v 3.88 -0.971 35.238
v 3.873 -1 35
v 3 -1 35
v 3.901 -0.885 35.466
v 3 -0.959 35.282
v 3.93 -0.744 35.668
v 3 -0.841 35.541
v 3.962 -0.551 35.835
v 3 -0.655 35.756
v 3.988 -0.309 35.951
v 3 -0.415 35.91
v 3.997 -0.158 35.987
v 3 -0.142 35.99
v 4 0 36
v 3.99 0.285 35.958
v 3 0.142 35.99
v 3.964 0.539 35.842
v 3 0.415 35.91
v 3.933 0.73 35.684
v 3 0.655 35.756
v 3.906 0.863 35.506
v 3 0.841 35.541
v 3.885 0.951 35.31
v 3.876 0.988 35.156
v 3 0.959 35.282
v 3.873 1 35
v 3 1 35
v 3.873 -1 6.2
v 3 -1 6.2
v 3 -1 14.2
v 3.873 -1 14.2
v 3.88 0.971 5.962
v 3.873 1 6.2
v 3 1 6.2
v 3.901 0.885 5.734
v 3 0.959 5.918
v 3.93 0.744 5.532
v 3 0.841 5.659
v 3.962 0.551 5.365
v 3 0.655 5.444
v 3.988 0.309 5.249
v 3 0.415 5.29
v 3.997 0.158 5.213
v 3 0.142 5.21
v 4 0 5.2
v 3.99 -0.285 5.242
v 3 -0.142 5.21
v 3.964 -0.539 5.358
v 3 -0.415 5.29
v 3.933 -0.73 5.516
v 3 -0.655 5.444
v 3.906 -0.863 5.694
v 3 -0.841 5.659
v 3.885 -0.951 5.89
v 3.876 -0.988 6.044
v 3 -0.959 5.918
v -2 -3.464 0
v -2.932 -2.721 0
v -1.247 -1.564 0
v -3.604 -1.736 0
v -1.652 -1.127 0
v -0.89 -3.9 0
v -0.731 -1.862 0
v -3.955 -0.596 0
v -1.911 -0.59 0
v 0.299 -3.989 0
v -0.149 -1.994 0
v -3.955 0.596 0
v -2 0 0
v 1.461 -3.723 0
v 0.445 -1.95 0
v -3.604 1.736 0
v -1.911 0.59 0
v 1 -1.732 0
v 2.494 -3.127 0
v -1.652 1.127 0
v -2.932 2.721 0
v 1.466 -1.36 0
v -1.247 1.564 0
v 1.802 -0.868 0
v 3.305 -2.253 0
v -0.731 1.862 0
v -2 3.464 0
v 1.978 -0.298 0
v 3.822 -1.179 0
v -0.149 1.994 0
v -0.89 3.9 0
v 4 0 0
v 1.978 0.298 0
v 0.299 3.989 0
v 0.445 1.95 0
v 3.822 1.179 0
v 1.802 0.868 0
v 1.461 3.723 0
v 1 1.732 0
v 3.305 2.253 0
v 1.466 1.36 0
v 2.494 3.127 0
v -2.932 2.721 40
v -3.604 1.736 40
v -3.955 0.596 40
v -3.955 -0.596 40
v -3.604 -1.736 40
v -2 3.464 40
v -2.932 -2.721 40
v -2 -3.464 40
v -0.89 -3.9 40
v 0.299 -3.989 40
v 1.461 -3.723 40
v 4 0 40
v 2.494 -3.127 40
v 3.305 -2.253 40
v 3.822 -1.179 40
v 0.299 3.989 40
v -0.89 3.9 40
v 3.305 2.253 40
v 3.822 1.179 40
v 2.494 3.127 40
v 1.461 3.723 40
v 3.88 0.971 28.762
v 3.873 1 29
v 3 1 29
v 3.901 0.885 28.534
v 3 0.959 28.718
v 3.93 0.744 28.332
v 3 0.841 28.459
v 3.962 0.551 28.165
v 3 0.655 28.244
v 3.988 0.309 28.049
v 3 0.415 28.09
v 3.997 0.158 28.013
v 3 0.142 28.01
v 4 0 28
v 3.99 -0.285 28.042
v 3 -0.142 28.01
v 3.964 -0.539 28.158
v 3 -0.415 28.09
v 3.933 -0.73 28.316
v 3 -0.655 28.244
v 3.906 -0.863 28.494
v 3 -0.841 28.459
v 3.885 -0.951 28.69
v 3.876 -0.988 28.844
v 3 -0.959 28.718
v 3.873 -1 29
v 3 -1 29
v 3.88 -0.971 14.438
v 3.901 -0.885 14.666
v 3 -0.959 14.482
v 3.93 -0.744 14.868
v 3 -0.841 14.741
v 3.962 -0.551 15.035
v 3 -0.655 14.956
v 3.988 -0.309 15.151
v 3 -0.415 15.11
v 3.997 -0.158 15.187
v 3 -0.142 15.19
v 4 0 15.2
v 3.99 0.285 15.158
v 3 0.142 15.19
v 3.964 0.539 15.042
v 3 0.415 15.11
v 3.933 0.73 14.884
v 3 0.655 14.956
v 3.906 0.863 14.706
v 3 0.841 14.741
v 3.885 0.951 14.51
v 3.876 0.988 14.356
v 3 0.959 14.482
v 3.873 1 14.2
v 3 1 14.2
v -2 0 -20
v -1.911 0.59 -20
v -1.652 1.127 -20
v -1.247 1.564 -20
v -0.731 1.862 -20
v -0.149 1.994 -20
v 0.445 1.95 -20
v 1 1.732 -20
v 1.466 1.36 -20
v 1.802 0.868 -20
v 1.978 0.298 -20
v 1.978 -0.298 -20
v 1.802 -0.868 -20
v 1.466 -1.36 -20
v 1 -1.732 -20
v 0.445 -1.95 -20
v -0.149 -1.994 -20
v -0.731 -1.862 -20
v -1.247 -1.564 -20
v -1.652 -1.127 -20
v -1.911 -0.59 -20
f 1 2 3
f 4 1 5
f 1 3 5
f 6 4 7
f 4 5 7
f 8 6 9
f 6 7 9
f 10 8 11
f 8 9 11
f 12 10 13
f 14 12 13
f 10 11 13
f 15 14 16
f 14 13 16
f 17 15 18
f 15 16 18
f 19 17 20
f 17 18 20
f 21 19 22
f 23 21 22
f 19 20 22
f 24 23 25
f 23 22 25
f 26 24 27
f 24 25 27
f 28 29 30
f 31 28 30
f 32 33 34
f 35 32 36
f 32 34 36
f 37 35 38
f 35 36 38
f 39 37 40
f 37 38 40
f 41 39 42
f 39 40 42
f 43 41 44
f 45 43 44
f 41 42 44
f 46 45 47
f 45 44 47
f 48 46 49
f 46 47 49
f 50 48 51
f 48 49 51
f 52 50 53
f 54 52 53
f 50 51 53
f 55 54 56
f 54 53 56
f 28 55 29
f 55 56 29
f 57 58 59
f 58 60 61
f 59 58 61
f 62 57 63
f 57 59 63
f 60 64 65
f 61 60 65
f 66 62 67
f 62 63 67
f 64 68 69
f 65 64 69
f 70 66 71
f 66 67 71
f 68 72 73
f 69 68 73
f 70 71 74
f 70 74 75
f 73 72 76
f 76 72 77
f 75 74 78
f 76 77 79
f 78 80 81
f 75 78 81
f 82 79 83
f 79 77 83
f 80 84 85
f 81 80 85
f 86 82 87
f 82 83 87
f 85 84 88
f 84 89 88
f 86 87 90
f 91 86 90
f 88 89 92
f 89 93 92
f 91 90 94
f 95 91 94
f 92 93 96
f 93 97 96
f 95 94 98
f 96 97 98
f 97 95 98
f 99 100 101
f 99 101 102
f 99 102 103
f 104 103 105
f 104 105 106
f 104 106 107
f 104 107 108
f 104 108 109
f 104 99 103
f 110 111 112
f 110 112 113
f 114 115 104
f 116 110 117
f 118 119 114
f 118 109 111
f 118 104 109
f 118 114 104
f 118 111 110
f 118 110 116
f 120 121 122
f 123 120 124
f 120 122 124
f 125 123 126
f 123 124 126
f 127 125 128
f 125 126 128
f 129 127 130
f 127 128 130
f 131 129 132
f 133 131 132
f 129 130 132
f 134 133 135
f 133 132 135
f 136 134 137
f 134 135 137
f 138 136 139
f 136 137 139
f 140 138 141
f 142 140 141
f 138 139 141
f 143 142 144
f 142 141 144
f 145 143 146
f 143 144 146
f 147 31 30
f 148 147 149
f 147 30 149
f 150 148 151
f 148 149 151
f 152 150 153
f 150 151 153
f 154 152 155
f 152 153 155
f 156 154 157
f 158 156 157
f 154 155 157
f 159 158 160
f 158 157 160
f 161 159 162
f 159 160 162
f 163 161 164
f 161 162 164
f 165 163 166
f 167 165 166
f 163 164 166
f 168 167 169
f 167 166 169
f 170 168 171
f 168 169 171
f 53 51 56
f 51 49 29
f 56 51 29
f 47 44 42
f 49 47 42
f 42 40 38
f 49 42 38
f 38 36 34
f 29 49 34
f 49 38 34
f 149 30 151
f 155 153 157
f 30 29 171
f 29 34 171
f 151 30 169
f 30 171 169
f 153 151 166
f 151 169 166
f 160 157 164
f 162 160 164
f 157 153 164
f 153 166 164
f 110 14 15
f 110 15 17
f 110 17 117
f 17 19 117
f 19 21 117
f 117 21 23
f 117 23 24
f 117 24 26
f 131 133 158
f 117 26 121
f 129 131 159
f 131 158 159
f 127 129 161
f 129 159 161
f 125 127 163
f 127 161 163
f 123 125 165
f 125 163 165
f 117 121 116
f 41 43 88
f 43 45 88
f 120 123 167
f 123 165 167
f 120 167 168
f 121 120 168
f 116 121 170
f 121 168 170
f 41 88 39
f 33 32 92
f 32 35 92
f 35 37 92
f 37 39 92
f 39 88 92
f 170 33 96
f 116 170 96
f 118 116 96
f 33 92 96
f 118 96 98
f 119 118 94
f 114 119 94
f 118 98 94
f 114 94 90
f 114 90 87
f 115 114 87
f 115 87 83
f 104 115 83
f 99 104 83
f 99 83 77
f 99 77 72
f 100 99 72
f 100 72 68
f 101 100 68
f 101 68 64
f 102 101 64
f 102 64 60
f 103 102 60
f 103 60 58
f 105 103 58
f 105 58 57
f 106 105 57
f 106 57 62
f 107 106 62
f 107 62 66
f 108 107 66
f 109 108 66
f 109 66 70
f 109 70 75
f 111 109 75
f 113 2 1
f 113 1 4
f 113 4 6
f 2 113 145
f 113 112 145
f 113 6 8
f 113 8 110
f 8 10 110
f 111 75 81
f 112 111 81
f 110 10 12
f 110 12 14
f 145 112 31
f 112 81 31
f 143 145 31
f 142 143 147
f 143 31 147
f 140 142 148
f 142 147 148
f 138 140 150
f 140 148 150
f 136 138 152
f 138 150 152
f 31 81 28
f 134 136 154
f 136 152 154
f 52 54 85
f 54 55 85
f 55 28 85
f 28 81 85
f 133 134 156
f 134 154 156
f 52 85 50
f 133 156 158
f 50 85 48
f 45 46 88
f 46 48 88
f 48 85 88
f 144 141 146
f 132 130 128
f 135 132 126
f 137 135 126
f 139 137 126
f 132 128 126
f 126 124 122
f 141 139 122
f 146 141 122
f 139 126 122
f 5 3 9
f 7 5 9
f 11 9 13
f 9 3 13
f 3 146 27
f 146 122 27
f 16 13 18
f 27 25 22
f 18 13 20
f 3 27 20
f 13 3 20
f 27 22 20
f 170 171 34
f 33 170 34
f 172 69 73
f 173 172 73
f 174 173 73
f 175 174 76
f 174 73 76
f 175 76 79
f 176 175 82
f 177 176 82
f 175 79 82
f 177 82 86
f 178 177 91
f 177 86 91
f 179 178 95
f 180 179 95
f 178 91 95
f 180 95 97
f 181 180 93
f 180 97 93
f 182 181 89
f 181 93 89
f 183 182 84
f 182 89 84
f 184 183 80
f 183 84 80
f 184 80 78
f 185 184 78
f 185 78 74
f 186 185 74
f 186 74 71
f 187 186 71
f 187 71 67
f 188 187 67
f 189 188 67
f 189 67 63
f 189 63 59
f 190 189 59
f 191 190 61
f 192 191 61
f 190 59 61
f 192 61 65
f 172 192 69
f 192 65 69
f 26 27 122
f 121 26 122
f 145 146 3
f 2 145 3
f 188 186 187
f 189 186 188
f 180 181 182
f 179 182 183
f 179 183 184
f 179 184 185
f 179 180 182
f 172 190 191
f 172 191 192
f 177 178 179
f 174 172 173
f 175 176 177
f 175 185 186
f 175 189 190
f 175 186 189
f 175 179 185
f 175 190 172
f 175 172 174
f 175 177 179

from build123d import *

# Parameters (mm, degrees)
SKETCH_1_R          = 4
EXTRUDE_1_DEPTH     = 40
SKETCH_2_R          = 2
EXTRUDE_2_DEPTH     = 20
CUT_EXTRUDE_1_DEPTH = 2


with BuildPart() as part:
    # ｽｹｯﾁ1 → ﾎﾞｽ - 押し出し1 (new body)
    with BuildSketch(Plane.XY):
        Circle(SKETCH_1_R)
    extrude(amount=EXTRUDE_1_DEPTH)

    # ｽｹｯﾁ2 → ﾎﾞｽ - 押し出し2 (add)
    with BuildSketch(Plane(origin=(0, 0, 0), x_dir=(-1, 0, 0), z_dir=(0, 0, -1))):
        Circle(SKETCH_2_R)
    extrude(amount=EXTRUDE_2_DEPTH)

    # ｽｹｯﾁ3 → ｶｯﾄ - 押し出し1 (cut, through all)
    with BuildSketch(Plane(origin=(3, 0, 0), x_dir=(0, 0, -1), z_dir=(1, 0, 0))):
        with BuildLine():
            Line((-35, 1), (-29, 1))
            ThreePointArc((-29, 1), (-28, 0), (-29, -1))
            Line((-29, -1), (-35, -1))
            ThreePointArc((-35, -1), (-36, 0), (-35, 1))
        make_face()
        with BuildLine():
            Line((-14.2, 1), (-6.2, 1))
            ThreePointArc((-6.2, 1), (-5.2, 0), (-6.2, -1))
            Line((-6.2, -1), (-14.2, -1))
            ThreePointArc((-14.2, -1), (-15.2, 0), (-14.2, 1))
        make_face()
    extrude(amount=CUT_EXTRUDE_1_DEPTH, mode=Mode.SUBTRACT)


solid = part.part
